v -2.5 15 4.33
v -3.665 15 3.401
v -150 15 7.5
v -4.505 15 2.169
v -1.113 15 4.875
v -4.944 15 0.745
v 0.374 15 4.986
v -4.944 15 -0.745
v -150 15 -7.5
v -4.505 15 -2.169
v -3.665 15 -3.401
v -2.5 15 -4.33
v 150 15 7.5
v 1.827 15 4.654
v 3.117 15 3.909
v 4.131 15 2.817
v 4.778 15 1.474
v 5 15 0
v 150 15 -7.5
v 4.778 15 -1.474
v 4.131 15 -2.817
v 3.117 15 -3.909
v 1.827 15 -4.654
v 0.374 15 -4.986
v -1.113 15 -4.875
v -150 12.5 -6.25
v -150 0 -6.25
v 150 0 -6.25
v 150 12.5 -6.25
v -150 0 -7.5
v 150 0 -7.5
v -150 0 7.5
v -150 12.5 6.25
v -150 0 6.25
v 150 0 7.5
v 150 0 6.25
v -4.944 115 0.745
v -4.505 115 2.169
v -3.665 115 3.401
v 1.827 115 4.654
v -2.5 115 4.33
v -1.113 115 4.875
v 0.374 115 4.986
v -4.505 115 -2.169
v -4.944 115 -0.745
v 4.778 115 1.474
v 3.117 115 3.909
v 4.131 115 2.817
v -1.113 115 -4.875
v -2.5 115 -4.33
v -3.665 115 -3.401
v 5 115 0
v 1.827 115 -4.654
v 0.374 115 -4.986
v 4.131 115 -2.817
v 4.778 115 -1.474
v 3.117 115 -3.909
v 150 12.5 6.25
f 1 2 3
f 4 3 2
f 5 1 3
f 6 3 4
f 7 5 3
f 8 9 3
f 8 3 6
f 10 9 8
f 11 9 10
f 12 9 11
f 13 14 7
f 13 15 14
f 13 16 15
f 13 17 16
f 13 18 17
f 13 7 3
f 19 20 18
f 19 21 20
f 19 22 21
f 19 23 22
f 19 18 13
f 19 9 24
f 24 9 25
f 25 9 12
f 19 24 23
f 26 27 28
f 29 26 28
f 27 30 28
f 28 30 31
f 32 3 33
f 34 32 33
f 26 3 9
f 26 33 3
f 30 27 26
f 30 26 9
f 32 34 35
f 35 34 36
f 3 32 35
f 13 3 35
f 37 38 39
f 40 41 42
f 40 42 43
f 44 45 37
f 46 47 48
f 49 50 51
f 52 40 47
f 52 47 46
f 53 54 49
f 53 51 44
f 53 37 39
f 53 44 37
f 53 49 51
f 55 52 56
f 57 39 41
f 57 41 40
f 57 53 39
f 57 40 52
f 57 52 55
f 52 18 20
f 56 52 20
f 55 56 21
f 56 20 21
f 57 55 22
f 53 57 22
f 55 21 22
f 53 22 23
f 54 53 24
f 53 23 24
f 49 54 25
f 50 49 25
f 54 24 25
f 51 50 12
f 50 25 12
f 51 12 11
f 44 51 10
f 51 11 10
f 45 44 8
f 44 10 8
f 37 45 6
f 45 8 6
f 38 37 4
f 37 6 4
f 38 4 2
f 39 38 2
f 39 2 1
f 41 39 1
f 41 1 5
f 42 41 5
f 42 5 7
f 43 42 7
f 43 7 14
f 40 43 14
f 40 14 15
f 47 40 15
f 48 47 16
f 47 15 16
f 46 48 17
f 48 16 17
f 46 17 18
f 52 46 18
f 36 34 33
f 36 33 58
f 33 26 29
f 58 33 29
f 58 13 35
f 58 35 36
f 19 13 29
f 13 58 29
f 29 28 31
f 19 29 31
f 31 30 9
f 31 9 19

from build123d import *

# Parameters (mm, degrees)
SKETCH1_W           = 300
SKETCH1_H           = 15
BOSS_EXTRUDE1_DEPTH = 15
SKETCH2_W           = 300
SKETCH2_H           = 12.5
CUT_EXTRUDE2_DEPTH  = 12.5
SKETCH3_R           = 5
BOSS_EXTRUDE2_DEPTH = 100


with BuildPart() as part:
    # Sketch1 → Boss-Extrude1 (new body)
    with BuildSketch(Plane(origin=(0, 0, 0), x_dir=(1, 0, 0), z_dir=(0, 1, 0))):
        Rectangle(SKETCH1_W, SKETCH1_H)
    extrude(amount=BOSS_EXTRUDE1_DEPTH)

    # Sketch2 → Cut-Extrude2 (cut)
    with BuildSketch(Plane(origin=(0, 0, 0), x_dir=(1, 0, 0), z_dir=(0, 1, 0))):
        Rectangle(SKETCH2_W, SKETCH2_H)
    extrude(amount=CUT_EXTRUDE2_DEPTH, mode=Mode.SUBTRACT)

    # Sketch3 → Boss-Extrude2 (add)
    with BuildSketch(Plane(origin=(0, 15, 0), x_dir=(1, 0, 0), z_dir=(0, 1, 0))):
        Circle(SKETCH3_R)
    extrude(amount=BOSS_EXTRUDE2_DEPTH)


solid = part.part
